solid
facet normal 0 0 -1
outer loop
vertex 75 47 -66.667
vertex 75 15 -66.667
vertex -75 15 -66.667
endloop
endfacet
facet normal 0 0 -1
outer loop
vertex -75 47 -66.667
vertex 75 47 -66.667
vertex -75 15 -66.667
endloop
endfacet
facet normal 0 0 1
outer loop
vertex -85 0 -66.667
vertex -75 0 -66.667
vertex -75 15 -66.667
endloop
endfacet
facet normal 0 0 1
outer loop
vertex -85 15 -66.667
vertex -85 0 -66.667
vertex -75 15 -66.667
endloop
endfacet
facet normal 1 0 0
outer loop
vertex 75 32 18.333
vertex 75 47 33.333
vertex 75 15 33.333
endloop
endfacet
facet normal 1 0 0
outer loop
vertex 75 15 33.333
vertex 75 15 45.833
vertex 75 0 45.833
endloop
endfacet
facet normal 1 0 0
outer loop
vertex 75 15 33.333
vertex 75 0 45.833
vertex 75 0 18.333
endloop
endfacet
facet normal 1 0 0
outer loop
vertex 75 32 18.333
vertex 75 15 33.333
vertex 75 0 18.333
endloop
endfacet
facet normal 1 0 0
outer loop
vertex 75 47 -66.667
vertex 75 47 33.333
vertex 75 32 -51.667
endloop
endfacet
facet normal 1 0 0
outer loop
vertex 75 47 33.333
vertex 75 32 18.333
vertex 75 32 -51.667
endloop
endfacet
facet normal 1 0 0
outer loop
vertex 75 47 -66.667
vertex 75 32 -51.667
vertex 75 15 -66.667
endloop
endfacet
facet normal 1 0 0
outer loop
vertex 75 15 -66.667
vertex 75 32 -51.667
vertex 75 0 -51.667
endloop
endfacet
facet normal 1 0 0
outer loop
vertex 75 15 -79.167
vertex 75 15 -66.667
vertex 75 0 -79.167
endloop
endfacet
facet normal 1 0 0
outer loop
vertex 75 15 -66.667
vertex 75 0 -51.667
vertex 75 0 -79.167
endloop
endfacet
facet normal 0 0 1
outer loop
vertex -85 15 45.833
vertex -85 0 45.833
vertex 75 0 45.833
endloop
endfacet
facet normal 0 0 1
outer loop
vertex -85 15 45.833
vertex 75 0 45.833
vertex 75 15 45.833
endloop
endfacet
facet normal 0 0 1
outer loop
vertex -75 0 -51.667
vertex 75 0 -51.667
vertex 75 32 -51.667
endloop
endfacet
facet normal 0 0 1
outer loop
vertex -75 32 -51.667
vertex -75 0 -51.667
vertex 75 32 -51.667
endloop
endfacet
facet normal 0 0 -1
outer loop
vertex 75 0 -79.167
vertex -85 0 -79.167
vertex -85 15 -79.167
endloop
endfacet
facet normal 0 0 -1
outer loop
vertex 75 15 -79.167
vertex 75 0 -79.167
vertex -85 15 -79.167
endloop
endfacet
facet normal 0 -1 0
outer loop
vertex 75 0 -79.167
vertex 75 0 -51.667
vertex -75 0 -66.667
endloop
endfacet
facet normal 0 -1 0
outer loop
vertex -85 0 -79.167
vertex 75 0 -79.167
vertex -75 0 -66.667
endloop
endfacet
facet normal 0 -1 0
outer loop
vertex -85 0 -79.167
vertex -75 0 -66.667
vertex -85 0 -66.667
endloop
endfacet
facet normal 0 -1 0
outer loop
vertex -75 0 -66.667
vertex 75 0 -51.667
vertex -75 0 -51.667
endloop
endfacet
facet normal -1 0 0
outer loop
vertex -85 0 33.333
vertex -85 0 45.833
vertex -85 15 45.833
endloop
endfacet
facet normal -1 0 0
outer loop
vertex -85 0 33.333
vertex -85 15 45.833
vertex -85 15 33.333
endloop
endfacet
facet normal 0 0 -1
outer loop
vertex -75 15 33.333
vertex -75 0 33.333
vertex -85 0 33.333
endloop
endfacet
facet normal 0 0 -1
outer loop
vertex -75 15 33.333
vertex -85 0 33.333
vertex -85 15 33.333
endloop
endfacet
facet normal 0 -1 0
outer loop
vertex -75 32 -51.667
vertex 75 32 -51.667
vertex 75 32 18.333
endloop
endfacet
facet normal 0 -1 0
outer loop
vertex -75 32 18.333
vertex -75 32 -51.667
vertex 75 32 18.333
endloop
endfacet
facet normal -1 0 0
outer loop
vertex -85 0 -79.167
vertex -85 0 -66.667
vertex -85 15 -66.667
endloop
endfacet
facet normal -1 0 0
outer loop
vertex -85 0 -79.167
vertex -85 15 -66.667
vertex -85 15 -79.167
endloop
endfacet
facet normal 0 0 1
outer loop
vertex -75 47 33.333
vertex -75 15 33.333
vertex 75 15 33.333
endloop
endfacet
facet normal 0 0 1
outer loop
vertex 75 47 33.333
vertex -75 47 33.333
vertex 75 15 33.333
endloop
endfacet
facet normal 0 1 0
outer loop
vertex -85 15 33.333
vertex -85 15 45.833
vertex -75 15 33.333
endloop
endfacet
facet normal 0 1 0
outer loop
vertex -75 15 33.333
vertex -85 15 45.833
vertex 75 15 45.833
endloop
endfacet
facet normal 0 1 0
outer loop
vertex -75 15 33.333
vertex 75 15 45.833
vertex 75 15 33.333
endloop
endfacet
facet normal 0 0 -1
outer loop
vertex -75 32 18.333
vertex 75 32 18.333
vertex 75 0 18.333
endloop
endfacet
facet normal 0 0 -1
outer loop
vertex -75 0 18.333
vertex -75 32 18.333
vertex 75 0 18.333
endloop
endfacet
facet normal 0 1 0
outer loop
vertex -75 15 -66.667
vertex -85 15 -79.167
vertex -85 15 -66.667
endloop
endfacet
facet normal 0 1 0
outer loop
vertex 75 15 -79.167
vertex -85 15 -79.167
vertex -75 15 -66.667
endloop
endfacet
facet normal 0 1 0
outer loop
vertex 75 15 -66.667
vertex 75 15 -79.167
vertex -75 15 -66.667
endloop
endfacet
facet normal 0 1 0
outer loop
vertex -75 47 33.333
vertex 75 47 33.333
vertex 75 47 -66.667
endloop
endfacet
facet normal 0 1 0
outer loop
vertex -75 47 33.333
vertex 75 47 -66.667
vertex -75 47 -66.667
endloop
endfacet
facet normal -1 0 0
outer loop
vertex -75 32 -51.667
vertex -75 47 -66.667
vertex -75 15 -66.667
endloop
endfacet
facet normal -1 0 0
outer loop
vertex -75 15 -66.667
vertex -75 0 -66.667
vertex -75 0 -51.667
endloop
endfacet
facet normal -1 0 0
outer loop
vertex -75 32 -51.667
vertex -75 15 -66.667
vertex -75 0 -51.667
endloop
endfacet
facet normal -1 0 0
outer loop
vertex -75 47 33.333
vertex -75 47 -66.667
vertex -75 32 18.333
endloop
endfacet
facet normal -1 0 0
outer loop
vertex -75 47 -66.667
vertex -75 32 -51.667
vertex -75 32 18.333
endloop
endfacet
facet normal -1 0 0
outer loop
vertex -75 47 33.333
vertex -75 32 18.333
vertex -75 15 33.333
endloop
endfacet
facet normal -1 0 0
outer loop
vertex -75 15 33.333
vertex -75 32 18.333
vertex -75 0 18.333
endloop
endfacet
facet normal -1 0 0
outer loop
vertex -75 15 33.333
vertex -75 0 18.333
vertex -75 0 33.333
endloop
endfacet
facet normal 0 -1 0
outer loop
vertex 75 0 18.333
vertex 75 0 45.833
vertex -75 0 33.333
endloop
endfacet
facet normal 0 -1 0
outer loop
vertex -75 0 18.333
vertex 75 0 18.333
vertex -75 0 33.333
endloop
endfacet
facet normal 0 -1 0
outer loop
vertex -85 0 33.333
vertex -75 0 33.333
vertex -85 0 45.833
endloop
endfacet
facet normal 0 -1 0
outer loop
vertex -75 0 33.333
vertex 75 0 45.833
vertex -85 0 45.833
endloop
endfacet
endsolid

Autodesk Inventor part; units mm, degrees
ref_plane "YZ Plane" through (0, 0, 0) normal (1, 0, 0) x (0, 1, 0)
ref_plane "XZ Plane" through (0, 0, 0) normal (0, 1, 0) x (-1, 0, 0)
ref_plane "XY Plane" through (0, 0, 0) normal (0, 0, 1) x (1, 0, 0)
sketch "Sketch1" plane through (0, 0, 0) normal (0, 1, 0) x (-1, 0, 0)
  line L0 (75, 33.3333) -> (-75, 33.3333)
  line L1 (-75, 33.3333) -> (-75, -66.6667)
  line L2 (-75, -66.6667) -> (75, -66.6667)
  line L3 (75, -66.6667) -> (75, 33.3333)
  point P0 (0, 0)
  dimension "d0" = 100
  dimension "d1" = 150
extrude "Extrusion1" add sketch "Sketch1" along normal blind 47
sketch "Sketch2" plane through (75, 0, 33.3333) normal (1, 0, 0) x (0, 0, -1)
  line L0 (15, -11) -> (85, -11)
  line L1 (85, -11) -> (85, 32)
  line L2 (85, 32) -> (15, 32)
  line L3 (15, 32) -> (15, -11)
  line L4 (0, 47) -> (100, 47) projected
  line L5 (100, 0) -> (100, 47) projected
  line L6 (0, 0) -> (0, 47) projected
  point P0 (33.3333, 0)
  dimension "d4" = 15
  dimension "d5" = 15
  dimension "d6" = 15
extrude "Extrusion2" cut sketch "Sketch2" against normal blind 200
sketch "Sketch3" plane through (75, 0, -66.6667) normal (1, 0, 0) x (0, 0, -1)
  line L0 (-100, 0) -> (-100, 47) projected
  line L1 (-100, 0) -> (-112.5, 0)
  line L2 (-112.5, 0) -> (-112.5, 15)
  line L3 (-112.5, 15) -> (-100, 15)
  line L4 (-100, 15) -> (-100, 0)
  line L5 (0, 0) -> (0, 47) projected
  line L6 (0, 0) -> (12.5, 0)
  line L7 (12.5, 0) -> (12.5, 15)
  line L8 (12.5, 15) -> (0, 15)
  line L9 (0, 15) -> (0, 0)
  point P0 (-66.6667, 0)
  point P1 (0, 15)
  dimension "d9" = 12.5
  dimension "d10" = 12.5
  dimension "d11" = 15
  dimension "d12" = 15
extrude "Extrusion3" add sketch "Sketch3" against normal blind 160
properties part number "ZadBabkaPodkladka" material "Aluminum 6061-AHC"
